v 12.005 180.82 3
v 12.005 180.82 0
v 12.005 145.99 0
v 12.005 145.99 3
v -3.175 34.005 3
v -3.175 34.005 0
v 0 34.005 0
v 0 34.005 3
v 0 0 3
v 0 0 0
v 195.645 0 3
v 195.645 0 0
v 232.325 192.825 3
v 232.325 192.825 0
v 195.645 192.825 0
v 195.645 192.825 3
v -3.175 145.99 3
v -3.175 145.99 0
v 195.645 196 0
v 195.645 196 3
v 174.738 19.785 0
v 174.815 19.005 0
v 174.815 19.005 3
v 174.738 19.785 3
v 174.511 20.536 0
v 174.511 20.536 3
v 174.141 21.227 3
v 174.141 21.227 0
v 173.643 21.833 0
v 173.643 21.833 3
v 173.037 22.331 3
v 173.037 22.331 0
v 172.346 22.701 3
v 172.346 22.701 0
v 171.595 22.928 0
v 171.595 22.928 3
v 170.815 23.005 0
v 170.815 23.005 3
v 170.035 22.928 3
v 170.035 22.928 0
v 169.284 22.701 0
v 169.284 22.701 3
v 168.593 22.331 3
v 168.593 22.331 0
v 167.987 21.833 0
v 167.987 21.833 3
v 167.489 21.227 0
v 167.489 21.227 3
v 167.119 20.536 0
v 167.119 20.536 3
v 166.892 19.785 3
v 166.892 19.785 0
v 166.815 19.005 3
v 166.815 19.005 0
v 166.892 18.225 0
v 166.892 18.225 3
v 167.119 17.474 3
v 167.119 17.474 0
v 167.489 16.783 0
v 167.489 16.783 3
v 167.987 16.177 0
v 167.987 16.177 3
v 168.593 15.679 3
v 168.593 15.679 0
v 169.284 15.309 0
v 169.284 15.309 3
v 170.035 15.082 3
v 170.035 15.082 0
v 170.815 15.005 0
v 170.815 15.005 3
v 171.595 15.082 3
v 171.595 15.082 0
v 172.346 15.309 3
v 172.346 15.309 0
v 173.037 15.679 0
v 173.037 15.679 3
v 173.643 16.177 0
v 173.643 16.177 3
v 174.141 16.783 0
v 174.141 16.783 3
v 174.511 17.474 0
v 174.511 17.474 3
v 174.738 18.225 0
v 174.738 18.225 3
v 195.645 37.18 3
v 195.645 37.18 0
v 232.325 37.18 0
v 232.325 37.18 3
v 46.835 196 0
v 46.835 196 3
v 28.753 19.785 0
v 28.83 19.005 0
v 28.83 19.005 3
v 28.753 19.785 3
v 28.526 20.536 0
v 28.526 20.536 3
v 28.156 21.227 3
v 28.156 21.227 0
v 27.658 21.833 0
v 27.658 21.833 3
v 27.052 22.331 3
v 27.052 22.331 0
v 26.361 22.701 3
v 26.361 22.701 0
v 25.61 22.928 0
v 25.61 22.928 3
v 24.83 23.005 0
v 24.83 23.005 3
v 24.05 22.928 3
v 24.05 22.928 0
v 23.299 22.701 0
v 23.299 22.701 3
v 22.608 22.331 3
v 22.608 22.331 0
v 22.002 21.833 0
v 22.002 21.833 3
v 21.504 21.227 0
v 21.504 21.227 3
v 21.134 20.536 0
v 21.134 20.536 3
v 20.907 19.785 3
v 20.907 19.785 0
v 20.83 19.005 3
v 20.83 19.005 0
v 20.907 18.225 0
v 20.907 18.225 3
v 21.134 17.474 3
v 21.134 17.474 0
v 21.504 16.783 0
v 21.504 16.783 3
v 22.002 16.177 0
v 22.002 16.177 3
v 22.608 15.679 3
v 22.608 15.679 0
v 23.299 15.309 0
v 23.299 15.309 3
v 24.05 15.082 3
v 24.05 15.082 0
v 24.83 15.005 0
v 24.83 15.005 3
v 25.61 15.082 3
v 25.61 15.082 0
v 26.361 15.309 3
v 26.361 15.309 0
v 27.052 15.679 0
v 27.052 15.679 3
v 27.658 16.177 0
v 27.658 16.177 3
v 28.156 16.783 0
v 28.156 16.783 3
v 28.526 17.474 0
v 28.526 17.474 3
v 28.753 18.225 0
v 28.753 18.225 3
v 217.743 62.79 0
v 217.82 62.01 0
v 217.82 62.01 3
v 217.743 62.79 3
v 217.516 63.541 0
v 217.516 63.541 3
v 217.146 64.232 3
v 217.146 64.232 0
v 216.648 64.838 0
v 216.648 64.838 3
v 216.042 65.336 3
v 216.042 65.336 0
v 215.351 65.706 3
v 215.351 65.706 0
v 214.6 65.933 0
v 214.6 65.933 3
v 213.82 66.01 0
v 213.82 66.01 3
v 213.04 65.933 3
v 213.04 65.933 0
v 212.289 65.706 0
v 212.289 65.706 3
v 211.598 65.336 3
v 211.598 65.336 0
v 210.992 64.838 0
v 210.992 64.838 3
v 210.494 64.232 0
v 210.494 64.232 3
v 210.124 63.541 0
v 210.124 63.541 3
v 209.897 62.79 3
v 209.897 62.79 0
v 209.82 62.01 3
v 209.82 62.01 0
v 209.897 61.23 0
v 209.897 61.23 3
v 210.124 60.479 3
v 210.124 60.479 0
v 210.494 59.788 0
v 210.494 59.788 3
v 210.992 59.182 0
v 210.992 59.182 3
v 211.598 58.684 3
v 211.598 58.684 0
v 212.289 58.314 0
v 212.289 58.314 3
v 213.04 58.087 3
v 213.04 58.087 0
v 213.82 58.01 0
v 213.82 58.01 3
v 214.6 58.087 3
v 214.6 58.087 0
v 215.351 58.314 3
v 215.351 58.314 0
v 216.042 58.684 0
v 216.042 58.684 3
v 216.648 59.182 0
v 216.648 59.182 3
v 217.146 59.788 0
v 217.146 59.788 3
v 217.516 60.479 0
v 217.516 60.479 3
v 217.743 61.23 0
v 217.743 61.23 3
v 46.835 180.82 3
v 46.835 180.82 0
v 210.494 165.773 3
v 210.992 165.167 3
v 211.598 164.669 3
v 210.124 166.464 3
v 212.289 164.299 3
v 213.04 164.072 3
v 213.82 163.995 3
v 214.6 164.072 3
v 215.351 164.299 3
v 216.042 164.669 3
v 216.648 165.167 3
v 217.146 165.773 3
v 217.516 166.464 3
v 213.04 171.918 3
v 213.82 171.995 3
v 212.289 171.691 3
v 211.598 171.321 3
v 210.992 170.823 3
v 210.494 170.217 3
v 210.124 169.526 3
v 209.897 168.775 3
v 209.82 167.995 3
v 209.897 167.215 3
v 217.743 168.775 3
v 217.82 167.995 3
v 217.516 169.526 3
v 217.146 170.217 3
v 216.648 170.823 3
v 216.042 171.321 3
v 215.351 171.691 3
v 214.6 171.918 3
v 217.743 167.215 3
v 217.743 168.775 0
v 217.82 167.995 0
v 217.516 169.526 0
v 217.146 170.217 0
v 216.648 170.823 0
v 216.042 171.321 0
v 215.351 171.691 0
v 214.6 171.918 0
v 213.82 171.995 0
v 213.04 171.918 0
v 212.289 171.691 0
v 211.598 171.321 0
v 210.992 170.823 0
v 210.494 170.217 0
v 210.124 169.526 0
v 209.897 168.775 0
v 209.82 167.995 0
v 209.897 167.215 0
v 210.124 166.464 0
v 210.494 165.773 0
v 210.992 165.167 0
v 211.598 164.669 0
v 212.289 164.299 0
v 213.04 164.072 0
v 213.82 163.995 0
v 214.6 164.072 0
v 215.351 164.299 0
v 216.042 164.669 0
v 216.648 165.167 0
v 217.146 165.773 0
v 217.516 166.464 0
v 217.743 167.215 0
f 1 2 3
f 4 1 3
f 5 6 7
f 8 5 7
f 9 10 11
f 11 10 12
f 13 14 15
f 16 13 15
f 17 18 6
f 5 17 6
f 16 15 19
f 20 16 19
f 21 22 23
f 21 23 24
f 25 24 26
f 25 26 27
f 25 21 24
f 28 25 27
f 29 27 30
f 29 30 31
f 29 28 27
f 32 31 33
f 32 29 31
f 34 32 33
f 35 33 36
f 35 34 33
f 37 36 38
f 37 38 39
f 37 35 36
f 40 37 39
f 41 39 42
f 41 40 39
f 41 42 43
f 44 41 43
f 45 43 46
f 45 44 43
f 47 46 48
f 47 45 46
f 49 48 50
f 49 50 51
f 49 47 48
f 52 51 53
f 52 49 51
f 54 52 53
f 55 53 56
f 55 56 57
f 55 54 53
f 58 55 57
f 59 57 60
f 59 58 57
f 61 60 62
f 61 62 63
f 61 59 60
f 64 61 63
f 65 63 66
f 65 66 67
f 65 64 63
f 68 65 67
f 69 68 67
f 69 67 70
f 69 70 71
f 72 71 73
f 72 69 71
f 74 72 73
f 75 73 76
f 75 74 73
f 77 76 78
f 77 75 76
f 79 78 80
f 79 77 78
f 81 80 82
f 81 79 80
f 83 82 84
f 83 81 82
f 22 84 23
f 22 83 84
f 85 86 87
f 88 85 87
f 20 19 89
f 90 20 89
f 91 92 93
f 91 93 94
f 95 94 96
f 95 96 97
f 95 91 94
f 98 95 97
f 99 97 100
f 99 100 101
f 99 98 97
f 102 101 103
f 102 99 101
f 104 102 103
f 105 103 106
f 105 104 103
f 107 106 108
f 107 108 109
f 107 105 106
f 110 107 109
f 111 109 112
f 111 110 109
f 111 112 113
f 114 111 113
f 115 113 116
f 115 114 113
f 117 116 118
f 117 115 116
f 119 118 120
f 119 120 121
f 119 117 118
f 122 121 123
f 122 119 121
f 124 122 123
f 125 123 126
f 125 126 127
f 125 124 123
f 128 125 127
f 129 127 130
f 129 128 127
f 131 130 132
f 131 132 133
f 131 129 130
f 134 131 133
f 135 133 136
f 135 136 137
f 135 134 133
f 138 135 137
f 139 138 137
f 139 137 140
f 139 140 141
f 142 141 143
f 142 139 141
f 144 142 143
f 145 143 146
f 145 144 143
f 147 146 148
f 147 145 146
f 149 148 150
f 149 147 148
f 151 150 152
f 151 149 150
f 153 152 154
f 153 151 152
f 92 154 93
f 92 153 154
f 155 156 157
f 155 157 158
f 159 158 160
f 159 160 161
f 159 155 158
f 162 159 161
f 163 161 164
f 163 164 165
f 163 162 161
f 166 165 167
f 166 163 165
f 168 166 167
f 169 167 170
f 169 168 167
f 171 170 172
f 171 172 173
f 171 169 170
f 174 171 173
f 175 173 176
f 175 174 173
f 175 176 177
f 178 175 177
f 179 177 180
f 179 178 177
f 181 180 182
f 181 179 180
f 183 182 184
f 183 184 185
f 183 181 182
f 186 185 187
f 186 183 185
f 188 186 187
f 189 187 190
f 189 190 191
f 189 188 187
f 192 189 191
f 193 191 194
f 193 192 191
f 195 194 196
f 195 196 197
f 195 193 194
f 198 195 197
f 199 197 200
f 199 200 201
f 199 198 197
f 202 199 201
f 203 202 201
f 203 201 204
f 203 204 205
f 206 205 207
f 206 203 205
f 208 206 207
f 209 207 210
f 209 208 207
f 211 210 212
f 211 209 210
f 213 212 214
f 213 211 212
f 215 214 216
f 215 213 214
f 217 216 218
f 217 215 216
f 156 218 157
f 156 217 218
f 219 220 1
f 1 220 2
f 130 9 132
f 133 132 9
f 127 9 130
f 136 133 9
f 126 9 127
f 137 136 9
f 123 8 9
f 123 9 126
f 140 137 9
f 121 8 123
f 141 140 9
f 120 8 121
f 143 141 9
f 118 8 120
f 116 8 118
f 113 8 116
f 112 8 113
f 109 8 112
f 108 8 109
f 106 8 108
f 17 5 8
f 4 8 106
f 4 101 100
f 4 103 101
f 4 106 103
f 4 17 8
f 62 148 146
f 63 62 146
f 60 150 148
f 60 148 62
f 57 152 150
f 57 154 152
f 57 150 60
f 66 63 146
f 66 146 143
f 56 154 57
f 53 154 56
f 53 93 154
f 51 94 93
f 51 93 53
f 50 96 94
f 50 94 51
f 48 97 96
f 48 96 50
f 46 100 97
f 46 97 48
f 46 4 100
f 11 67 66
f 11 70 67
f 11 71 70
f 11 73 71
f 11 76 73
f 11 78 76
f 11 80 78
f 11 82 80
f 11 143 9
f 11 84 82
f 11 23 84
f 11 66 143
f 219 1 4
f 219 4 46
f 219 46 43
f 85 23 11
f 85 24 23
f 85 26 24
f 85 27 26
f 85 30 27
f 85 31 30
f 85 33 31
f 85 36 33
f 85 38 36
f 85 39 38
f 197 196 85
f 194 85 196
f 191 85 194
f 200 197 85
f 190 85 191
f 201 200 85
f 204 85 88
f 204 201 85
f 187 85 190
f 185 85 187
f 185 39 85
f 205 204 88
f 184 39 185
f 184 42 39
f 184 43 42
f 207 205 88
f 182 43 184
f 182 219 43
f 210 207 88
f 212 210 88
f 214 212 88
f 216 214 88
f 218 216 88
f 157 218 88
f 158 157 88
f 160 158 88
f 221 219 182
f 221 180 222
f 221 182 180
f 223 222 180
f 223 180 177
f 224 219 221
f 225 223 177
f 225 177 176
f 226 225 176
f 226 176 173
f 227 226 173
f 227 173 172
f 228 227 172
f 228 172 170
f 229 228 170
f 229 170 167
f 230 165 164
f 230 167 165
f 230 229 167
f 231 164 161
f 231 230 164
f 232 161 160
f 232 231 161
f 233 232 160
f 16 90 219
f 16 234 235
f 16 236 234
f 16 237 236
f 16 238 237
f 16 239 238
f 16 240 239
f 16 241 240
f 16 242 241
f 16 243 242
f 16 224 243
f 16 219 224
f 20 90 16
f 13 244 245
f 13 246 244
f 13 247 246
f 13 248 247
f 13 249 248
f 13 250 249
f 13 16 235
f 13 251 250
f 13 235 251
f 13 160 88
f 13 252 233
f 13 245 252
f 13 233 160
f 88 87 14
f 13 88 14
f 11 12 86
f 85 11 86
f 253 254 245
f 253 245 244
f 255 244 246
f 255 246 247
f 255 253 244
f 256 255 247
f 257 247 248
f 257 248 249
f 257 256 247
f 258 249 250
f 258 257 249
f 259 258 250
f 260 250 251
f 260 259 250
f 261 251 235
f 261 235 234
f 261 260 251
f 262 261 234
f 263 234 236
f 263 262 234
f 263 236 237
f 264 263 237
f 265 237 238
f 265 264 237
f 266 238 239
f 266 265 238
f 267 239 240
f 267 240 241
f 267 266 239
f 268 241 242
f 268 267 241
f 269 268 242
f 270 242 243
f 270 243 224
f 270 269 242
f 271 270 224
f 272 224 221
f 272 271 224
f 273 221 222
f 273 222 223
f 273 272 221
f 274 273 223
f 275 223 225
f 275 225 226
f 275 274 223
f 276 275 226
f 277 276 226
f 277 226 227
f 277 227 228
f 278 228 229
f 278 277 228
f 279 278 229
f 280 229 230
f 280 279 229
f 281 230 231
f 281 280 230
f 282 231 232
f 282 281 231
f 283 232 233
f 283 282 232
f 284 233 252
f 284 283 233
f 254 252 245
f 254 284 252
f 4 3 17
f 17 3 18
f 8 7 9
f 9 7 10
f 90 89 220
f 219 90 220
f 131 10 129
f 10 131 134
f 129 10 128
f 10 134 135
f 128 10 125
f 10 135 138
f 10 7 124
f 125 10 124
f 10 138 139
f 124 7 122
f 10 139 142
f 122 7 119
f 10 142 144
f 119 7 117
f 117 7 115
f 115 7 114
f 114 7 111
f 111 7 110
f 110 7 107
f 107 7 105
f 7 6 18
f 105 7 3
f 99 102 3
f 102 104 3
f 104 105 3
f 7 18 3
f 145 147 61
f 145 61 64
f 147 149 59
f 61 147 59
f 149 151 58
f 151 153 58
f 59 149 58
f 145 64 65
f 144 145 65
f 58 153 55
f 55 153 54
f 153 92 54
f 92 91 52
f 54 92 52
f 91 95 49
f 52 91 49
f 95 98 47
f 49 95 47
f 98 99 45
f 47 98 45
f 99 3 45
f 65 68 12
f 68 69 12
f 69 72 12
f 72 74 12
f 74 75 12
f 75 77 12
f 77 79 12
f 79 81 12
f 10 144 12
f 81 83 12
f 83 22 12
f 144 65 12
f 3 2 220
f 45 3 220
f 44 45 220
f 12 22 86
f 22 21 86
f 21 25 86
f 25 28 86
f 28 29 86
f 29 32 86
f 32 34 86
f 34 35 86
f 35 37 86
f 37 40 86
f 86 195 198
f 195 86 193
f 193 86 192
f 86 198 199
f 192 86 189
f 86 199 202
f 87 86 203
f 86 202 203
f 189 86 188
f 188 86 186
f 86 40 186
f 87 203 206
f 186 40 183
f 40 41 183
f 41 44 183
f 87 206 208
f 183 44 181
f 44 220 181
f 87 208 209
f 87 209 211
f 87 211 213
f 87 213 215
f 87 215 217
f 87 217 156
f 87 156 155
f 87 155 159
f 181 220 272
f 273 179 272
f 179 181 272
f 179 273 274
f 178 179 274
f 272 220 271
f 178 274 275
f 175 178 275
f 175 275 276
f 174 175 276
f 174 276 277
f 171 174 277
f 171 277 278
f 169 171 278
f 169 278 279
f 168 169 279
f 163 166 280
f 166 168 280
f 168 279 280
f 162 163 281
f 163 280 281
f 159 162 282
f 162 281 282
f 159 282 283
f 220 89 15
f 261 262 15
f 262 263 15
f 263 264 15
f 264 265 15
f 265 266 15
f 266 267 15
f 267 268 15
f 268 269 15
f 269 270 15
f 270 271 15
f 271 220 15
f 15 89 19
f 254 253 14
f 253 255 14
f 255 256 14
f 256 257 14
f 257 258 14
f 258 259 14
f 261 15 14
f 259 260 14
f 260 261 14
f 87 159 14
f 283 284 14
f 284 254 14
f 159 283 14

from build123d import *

# Parameters (mm, degrees)
SKETCH1_R           = 4
BOSS_EXTRUDE1_DEPTH = 3


with BuildPart() as part:
    # Sketch1 → Boss-Extrude1 (new body)
    with BuildSketch(Plane.XY):
        Polygon((195.645, 0), (195.645, 37.18), (232.325, 37.18), (232.325, 192.825), (195.645, 192.825), (195.645, 196), (46.835, 196), (46.835, 180.82), (12.005, 180.82), (12.005, 145.99), (-3.175, 145.99), (-3.175, 34.005), (0, 34.005), (0, 0), align=None)
        with Locations((170.815, 19.005)):
            Circle(SKETCH1_R, mode=Mode.SUBTRACT)
        with Locations((24.83, 19.005)):
            Circle(SKETCH1_R, mode=Mode.SUBTRACT)
        with Locations((213.82, 62.01)):
            Circle(SKETCH1_R, mode=Mode.SUBTRACT)
        with Locations((213.82, 167.995)):
            Circle(SKETCH1_R, mode=Mode.SUBTRACT)
    extrude(amount=BOSS_EXTRUDE1_DEPTH)


solid = part.part
